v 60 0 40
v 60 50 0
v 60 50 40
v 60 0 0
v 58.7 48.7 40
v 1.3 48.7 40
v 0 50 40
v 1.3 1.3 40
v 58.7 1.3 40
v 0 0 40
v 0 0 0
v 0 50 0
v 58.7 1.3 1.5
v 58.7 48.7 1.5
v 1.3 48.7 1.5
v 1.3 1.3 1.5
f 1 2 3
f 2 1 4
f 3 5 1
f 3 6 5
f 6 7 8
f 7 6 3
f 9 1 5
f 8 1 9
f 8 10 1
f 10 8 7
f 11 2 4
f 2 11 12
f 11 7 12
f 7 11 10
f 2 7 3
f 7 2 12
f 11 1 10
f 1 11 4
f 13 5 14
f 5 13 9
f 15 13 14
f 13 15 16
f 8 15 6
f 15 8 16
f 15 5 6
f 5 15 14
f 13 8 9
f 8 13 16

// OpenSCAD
$fn = 32;

// ----------------------------------------------------------------------
// Open box: 1.3 mm walls
// ----------------------------------------------------------------------

// --- parameters (mm) ---
box_l = 60;               // outer length, X
box_w = 50;               // outer width, Y
box_h = 40;               // outer height, Z
wall = 1.3;               // wall thickness
floor = 1.5;              // floor thickness

difference() {
  cube([box_l, box_w, box_h]);
  translate([wall, wall, floor])
    cube([box_l - 2 * wall, box_w - 2 * wall, box_h]);
}
